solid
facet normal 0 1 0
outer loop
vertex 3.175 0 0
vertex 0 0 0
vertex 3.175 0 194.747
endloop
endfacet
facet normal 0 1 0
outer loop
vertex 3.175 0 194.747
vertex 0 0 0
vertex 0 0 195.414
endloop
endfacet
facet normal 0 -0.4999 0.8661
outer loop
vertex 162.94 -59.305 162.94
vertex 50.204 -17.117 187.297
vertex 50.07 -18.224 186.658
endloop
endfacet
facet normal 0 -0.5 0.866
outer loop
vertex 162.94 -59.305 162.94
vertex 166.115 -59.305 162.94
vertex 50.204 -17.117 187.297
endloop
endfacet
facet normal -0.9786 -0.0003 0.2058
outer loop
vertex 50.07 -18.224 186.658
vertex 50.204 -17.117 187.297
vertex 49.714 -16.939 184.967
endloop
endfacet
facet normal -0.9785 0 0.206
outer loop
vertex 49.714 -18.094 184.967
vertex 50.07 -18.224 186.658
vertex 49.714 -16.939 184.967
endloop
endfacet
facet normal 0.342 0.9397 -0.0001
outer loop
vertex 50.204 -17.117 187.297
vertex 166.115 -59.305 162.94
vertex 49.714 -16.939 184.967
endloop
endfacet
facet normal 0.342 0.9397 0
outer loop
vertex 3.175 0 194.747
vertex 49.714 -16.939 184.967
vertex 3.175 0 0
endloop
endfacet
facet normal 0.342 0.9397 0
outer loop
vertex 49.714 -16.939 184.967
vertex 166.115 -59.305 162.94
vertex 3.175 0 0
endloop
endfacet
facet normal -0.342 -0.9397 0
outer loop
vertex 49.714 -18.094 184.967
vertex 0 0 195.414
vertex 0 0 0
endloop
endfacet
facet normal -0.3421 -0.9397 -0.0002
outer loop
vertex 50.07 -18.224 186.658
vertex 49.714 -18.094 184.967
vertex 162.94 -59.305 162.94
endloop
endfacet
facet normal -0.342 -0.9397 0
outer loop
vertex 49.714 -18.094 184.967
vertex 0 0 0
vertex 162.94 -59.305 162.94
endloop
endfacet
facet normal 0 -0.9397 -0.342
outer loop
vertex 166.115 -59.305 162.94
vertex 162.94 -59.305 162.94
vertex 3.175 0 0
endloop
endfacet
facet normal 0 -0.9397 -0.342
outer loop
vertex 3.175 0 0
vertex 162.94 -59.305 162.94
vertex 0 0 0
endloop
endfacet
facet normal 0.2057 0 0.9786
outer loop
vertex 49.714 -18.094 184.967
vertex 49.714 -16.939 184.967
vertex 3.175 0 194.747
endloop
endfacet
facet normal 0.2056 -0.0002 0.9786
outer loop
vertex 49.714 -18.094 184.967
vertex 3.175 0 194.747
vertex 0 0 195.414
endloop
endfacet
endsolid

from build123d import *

# Parameters (mm, degrees)
BOSS_EXTRUDE1_DEPTH     = 304.8
CUT_EXTRUDE1_DEPTH      = 198.18
CUT_EXTRUDE1_DEPTH_BACK = 1
CUT_EXTRUDE4_DEPTH      = 60.305329017


with BuildPart() as part:
    # Sketch1 → Boss-Extrude1 (new body)
    with BuildSketch(Plane(origin=(0, 0, 0), x_dir=(0, 0, -1), z_dir=(1, 0, 0))):
        Polygon((0, 0), (-197.18, 0), (-162.940052328, -59.305329017), align=None)
    extrude(amount=BOSS_EXTRUDE1_DEPTH)

    # Sketch2 → Cut-Extrude1 (cut, two sides)
    with BuildSketch(Plane.XY) as cut_extrude1_sk:
        Polygon((0, 0), (162.940052328, -59.305329017), (0, -59.305329017), align=None)
        Polygon((166.115052328, -59.305329017), (3.175, 0), (304.8, 0), (304.8, -59.305329017), align=None)
    extrude(amount=CUT_EXTRUDE1_DEPTH, mode=Mode.SUBTRACT)
    extrude(cut_extrude1_sk.sketch, amount=-CUT_EXTRUDE1_DEPTH_BACK, mode=Mode.SUBTRACT)

    # Sketch4 → Cut-Extrude4 (cut, through all)
    with BuildSketch(Plane(origin=(0, 0, 0), x_dir=(1, 0, 0), z_dir=(0, 1, 0))):
        Polygon((50.203910812, -187.297424032), (49.714214198, -184.967070242), (0, -195.413931332), (0, -197.18), (3.175, -197.18), align=None)
    extrude(amount=-CUT_EXTRUDE4_DEPTH, mode=Mode.SUBTRACT)


solid = part.part
